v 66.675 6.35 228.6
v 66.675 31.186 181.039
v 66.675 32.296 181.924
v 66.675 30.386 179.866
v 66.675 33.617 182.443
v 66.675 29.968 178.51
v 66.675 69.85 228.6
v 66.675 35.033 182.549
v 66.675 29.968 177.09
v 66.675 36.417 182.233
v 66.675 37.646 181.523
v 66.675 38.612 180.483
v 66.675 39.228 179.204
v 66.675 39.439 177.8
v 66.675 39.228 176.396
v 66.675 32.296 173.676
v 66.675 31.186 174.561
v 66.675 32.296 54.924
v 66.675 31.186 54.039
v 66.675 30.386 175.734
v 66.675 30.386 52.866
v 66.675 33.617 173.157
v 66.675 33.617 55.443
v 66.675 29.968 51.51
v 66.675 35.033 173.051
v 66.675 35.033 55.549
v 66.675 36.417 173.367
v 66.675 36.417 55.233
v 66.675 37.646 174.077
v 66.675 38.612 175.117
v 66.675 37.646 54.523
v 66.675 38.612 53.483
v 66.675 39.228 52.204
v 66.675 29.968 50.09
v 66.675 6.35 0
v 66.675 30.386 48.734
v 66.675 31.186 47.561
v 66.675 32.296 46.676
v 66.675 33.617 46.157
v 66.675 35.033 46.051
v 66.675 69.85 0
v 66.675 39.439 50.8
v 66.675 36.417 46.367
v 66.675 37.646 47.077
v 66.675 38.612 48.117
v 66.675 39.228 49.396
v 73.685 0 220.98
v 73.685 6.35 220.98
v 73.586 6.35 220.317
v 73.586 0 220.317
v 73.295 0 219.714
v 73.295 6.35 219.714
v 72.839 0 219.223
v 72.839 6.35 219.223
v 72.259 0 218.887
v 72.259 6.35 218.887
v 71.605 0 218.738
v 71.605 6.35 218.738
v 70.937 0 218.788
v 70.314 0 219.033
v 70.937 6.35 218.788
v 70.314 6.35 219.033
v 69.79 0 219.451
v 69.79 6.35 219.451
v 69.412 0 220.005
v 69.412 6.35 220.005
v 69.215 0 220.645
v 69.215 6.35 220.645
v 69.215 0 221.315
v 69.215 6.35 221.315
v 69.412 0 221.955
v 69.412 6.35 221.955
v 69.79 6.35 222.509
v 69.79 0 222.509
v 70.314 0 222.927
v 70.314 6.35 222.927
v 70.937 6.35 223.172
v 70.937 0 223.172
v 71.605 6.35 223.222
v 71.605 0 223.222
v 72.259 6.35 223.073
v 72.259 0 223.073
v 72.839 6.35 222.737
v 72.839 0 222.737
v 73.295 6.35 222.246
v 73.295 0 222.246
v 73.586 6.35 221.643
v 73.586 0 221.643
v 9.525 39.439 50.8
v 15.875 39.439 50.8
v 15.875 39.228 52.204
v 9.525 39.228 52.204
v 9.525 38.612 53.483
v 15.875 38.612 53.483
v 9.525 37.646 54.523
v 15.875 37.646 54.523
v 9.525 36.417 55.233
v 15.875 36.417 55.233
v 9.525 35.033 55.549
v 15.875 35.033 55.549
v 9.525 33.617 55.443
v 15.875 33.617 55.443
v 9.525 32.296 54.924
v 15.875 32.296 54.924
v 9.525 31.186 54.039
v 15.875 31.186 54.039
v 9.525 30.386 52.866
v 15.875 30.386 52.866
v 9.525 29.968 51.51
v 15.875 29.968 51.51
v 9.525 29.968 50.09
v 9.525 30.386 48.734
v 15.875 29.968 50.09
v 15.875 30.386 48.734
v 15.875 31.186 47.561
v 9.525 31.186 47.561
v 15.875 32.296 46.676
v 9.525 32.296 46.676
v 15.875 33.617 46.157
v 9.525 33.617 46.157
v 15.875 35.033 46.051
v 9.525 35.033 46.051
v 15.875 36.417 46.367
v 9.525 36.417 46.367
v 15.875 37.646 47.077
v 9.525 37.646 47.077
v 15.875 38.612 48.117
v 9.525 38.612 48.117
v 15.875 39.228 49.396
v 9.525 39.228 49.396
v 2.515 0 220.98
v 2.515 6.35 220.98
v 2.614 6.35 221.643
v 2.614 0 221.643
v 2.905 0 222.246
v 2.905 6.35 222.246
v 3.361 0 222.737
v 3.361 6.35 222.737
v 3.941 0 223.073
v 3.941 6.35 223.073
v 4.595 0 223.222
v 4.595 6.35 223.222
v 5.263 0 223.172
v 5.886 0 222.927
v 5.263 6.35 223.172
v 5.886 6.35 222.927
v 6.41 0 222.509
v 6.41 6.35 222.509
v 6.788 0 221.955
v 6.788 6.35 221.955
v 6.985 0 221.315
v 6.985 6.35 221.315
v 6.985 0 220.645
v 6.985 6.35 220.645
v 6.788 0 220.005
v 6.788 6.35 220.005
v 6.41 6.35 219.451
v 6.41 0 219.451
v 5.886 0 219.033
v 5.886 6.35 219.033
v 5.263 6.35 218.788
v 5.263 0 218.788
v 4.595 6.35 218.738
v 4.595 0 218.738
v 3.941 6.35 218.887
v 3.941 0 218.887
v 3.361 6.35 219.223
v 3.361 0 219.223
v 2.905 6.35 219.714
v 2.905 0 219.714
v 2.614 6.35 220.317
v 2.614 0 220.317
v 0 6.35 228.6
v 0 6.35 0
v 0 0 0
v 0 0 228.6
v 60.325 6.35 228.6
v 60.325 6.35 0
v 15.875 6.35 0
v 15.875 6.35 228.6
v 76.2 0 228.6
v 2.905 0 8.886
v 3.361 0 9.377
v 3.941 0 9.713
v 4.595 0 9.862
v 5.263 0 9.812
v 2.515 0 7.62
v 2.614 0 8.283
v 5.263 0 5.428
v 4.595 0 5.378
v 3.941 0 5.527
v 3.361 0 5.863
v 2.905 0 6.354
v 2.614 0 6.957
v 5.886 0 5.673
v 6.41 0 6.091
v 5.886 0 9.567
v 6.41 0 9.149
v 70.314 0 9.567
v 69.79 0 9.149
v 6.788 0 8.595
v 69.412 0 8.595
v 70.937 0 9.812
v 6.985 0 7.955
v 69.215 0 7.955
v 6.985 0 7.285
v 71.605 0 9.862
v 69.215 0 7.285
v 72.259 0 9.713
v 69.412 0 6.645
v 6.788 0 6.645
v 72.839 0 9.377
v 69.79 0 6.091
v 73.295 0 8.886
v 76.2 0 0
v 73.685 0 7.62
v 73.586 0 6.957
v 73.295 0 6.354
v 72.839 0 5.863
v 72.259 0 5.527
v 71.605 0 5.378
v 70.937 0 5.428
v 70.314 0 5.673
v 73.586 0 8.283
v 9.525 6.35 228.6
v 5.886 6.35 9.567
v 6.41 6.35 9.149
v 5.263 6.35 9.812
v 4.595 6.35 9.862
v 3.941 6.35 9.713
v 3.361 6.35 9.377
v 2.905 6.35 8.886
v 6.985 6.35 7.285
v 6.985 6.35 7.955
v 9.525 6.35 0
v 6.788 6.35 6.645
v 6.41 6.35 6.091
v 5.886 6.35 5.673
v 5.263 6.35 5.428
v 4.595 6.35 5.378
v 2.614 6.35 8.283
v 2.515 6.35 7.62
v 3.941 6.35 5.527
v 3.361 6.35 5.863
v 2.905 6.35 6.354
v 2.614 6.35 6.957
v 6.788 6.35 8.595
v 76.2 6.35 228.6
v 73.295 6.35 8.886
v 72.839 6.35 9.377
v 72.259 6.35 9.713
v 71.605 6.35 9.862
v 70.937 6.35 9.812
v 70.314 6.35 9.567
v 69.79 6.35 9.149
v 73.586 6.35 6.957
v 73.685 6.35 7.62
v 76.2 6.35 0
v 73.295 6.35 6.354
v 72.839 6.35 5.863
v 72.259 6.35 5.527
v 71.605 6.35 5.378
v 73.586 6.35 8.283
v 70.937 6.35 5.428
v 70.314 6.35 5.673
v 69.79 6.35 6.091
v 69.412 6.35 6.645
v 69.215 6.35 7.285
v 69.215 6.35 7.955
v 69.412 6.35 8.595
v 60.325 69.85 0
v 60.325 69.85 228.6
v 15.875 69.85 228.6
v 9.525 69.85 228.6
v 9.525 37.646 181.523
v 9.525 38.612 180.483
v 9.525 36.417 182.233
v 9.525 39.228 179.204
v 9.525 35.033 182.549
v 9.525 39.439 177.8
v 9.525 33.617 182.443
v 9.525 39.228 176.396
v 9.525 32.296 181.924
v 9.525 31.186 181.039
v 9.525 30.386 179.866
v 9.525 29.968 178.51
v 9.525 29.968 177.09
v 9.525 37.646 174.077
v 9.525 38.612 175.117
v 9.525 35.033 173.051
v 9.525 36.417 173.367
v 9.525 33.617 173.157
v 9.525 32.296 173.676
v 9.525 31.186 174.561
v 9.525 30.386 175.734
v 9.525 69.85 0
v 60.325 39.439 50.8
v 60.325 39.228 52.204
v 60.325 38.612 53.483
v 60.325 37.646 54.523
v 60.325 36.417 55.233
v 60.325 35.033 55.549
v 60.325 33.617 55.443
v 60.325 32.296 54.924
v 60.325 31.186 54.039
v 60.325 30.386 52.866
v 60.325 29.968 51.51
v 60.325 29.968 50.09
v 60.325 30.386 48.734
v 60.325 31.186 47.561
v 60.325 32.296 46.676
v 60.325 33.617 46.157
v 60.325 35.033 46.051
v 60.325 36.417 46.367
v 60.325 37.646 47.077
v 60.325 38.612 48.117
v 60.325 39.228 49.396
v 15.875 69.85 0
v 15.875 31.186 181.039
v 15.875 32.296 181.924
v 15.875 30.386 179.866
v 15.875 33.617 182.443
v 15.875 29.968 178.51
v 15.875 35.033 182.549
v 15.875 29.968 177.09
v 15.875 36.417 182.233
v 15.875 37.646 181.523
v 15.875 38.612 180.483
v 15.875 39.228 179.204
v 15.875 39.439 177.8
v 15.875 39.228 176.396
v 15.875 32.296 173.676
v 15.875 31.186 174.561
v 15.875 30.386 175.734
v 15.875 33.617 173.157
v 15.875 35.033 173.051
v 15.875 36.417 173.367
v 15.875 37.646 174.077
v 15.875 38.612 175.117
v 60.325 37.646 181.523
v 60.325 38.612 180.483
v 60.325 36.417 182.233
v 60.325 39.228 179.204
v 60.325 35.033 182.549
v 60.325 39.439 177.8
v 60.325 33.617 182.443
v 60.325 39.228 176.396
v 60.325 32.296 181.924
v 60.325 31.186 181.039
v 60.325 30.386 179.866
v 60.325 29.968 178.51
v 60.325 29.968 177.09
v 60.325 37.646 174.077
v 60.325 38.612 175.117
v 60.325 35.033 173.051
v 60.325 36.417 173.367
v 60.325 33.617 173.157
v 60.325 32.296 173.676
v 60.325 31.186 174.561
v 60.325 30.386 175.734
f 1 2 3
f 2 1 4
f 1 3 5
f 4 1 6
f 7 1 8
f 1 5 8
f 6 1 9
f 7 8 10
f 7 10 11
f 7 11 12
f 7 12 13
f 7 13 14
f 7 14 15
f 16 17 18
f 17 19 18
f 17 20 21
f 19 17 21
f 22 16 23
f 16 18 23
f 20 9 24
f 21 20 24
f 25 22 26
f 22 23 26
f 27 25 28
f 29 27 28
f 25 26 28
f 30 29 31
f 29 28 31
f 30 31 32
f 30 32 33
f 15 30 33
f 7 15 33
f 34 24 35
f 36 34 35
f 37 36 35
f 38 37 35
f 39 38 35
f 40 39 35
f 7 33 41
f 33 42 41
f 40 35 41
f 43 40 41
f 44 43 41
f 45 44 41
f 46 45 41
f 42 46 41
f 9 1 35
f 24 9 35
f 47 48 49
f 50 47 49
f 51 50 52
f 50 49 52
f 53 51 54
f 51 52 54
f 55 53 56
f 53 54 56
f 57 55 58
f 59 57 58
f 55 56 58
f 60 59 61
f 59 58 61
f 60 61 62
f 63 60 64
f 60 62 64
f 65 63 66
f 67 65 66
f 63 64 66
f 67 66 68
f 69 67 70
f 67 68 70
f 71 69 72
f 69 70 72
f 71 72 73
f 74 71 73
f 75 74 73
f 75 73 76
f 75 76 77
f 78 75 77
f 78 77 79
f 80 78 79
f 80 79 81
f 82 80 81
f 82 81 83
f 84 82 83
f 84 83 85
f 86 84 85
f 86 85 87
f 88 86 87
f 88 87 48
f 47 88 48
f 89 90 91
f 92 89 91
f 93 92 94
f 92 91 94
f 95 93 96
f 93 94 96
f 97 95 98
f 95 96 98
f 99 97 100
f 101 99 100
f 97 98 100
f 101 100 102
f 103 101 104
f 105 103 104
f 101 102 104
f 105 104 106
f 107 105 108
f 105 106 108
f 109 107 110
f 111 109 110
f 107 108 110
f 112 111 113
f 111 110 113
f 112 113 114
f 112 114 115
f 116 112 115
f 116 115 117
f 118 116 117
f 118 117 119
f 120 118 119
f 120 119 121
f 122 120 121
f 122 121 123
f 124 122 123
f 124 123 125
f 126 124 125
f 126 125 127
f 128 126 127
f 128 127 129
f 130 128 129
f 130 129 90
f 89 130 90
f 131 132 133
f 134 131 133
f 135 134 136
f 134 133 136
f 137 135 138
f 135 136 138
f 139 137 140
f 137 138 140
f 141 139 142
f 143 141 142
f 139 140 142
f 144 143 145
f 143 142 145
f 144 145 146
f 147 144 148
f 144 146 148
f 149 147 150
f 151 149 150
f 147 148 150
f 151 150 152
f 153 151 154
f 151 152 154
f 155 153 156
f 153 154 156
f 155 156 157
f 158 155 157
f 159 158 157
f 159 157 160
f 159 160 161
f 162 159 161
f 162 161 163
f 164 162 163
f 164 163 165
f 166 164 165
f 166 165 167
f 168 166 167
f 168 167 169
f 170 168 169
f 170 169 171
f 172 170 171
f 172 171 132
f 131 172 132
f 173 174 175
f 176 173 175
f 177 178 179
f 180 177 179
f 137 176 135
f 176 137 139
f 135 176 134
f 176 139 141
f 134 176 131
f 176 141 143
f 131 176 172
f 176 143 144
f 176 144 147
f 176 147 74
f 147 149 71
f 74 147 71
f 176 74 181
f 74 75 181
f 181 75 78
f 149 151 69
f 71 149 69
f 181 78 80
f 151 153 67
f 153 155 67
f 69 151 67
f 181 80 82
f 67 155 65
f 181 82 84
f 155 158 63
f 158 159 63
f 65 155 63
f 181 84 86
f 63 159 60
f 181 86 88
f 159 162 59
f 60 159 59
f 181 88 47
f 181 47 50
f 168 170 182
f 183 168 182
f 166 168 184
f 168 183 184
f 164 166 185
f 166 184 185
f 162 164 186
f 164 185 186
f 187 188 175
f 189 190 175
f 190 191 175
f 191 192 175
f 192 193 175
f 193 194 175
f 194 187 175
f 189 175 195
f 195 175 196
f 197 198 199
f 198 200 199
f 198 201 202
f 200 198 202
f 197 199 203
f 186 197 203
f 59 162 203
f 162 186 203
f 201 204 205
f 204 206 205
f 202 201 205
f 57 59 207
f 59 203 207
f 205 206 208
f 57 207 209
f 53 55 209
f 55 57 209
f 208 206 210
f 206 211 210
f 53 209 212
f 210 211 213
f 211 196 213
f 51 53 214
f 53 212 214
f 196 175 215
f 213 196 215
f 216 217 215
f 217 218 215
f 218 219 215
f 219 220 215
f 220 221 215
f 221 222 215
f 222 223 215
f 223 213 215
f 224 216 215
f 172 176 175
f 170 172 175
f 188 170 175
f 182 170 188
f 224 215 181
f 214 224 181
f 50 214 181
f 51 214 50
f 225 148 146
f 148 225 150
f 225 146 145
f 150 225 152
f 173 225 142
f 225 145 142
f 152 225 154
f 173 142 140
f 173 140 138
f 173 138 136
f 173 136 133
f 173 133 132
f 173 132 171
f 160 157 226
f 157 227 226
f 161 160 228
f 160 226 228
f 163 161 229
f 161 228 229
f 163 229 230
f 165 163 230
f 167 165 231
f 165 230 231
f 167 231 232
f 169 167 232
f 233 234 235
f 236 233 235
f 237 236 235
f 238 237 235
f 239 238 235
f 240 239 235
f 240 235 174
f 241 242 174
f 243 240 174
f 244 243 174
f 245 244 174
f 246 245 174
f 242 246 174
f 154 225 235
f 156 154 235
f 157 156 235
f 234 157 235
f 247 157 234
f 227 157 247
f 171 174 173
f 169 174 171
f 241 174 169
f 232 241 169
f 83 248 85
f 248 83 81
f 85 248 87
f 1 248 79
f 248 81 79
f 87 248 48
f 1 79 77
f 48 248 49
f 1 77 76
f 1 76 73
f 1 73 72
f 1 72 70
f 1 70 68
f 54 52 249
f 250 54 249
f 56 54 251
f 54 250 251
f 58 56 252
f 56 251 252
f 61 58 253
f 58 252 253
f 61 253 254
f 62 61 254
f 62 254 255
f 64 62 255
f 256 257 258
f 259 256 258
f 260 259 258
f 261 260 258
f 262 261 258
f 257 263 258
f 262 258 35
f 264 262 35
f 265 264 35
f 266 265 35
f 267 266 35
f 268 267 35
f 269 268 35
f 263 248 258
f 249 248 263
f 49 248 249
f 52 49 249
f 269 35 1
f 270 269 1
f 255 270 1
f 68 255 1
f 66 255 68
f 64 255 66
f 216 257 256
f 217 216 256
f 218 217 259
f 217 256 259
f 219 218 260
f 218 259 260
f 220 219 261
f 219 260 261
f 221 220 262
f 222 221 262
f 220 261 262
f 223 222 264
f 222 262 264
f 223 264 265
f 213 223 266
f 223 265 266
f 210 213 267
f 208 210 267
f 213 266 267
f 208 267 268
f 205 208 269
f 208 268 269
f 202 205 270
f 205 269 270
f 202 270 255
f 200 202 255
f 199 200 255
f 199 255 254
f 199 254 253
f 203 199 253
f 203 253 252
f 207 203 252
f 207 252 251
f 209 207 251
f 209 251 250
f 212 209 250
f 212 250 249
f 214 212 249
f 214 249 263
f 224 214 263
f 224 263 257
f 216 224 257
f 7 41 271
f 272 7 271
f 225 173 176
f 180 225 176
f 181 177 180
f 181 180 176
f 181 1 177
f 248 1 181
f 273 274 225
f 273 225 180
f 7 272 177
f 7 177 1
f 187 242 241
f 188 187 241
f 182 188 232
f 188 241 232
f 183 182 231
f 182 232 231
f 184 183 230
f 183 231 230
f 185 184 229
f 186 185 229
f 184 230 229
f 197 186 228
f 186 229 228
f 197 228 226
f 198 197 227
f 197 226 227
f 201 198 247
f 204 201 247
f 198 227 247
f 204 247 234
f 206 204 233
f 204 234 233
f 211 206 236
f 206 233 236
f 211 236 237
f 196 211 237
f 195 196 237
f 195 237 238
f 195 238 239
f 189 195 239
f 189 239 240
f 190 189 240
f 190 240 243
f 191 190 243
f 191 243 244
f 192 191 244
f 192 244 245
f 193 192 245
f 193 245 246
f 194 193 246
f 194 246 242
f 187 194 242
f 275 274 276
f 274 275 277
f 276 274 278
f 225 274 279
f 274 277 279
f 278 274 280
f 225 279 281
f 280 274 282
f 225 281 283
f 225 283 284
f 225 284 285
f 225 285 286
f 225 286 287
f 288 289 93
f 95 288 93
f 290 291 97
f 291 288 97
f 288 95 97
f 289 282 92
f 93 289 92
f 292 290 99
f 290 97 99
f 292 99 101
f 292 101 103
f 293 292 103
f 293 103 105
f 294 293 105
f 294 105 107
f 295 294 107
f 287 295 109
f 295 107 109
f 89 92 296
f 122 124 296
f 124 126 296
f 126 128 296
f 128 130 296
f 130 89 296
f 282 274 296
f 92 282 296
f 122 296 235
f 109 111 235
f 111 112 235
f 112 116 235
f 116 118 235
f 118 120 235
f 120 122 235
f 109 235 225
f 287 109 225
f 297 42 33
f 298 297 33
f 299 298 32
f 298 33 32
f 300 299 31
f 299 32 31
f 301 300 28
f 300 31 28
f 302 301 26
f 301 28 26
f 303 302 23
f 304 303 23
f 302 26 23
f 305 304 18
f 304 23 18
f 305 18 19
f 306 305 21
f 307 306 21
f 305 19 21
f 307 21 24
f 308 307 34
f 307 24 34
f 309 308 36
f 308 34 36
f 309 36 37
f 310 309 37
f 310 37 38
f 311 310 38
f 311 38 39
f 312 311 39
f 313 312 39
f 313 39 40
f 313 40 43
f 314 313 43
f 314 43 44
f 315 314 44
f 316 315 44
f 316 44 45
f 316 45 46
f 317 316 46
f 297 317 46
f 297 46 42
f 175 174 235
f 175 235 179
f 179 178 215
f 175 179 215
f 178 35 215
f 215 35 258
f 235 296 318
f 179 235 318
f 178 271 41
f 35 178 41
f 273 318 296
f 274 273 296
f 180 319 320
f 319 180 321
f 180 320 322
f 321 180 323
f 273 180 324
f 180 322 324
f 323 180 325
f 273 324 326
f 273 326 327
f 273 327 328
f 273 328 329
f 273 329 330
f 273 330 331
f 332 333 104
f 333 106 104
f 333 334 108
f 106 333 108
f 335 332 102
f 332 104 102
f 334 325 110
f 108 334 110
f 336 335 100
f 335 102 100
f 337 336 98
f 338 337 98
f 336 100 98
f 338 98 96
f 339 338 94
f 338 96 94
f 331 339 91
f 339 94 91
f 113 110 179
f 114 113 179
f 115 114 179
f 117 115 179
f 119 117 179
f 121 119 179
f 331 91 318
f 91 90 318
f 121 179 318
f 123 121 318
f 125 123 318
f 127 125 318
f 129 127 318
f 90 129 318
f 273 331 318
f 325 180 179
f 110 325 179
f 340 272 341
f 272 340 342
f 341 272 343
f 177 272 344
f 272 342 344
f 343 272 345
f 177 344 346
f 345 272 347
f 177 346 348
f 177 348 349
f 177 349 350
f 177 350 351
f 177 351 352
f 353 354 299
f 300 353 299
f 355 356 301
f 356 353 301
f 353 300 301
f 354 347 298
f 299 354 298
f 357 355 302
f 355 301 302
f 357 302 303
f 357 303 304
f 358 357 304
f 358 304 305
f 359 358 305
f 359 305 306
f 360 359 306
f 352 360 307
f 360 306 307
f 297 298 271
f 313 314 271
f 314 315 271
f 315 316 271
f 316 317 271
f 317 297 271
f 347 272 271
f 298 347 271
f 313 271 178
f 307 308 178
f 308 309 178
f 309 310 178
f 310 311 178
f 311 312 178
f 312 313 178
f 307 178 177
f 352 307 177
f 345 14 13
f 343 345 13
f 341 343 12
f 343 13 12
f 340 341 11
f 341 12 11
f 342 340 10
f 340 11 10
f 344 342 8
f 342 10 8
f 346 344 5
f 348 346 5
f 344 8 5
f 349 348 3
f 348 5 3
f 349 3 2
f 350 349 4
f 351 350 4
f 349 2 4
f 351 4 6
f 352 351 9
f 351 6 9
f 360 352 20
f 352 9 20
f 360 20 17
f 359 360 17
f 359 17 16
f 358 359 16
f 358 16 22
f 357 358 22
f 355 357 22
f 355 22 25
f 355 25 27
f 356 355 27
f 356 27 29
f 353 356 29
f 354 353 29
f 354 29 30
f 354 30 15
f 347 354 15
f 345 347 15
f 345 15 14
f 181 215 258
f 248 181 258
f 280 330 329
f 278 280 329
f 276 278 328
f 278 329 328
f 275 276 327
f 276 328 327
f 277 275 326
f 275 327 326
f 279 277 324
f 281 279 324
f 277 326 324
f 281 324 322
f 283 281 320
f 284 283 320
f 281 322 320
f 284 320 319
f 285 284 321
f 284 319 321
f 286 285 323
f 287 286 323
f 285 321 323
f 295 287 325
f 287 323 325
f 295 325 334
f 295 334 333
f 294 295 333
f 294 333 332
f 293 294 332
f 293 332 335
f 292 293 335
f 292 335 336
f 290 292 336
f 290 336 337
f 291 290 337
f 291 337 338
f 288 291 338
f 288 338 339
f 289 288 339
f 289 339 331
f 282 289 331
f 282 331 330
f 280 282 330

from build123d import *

# Parameters (mm, degrees)
BOSS_EXTRUDE1_DEPTH = 228.6
SKETCH4_R           = 2.2479
CUT_EXTRUDE1_DEPTH  = 250.191994253
SKETCH5_R           = 4.7625
CUT_EXTRUDE2_DEPTH  = 249.158292477


with BuildPart() as part:
    # Sketch1 → Boss-Extrude1 (new body)
    with BuildSketch(Plane.XY):
        Polygon((0, 0), (76.2, 0), (76.2, 6.35), (66.675, 6.35), (66.675, 69.85), (60.325, 69.85), (60.325, 6.35), (15.875, 6.35), (15.875, 69.85), (9.525, 69.85), (9.525, 6.35), (0, 6.35), align=None)
    extrude(amount=BOSS_EXTRUDE1_DEPTH)

    # Sketch4 → Cut-Extrude1 (cut, through all)
    with BuildSketch(Plane(origin=(0, 6.35, 0), x_dir=(1, 0, 0), z_dir=(0, 1, 0))):
        with Locations(Location((4.7625, -7.62, 0), (0, 0, 180))):
            Circle(SKETCH4_R)
        with Locations(Location((4.7625, -220.98, 0), (0, 0, 180))):
            Circle(SKETCH4_R)
        with Locations((71.4375, -220.98)):
            Circle(SKETCH4_R)
        with Locations((71.4375, -7.62)):
            Circle(SKETCH4_R)
    extrude(amount=-CUT_EXTRUDE1_DEPTH, mode=Mode.SUBTRACT)

    # Sketch5 → Cut-Extrude2 (cut, through all)
    with BuildSketch(Plane(origin=(66.675, 0, 0), x_dir=(0, 0, -1), z_dir=(1, 0, 0))):
        with Locations(Location((-177.8, 34.676908919, 0), (0, 0, 90))):
            Circle(SKETCH5_R)
        with Locations(Location((-50.8, 34.676908919, 0), (0, 0, 90))):
            Circle(SKETCH5_R)
    extrude(amount=-CUT_EXTRUDE2_DEPTH, mode=Mode.SUBTRACT)


solid = part.part
